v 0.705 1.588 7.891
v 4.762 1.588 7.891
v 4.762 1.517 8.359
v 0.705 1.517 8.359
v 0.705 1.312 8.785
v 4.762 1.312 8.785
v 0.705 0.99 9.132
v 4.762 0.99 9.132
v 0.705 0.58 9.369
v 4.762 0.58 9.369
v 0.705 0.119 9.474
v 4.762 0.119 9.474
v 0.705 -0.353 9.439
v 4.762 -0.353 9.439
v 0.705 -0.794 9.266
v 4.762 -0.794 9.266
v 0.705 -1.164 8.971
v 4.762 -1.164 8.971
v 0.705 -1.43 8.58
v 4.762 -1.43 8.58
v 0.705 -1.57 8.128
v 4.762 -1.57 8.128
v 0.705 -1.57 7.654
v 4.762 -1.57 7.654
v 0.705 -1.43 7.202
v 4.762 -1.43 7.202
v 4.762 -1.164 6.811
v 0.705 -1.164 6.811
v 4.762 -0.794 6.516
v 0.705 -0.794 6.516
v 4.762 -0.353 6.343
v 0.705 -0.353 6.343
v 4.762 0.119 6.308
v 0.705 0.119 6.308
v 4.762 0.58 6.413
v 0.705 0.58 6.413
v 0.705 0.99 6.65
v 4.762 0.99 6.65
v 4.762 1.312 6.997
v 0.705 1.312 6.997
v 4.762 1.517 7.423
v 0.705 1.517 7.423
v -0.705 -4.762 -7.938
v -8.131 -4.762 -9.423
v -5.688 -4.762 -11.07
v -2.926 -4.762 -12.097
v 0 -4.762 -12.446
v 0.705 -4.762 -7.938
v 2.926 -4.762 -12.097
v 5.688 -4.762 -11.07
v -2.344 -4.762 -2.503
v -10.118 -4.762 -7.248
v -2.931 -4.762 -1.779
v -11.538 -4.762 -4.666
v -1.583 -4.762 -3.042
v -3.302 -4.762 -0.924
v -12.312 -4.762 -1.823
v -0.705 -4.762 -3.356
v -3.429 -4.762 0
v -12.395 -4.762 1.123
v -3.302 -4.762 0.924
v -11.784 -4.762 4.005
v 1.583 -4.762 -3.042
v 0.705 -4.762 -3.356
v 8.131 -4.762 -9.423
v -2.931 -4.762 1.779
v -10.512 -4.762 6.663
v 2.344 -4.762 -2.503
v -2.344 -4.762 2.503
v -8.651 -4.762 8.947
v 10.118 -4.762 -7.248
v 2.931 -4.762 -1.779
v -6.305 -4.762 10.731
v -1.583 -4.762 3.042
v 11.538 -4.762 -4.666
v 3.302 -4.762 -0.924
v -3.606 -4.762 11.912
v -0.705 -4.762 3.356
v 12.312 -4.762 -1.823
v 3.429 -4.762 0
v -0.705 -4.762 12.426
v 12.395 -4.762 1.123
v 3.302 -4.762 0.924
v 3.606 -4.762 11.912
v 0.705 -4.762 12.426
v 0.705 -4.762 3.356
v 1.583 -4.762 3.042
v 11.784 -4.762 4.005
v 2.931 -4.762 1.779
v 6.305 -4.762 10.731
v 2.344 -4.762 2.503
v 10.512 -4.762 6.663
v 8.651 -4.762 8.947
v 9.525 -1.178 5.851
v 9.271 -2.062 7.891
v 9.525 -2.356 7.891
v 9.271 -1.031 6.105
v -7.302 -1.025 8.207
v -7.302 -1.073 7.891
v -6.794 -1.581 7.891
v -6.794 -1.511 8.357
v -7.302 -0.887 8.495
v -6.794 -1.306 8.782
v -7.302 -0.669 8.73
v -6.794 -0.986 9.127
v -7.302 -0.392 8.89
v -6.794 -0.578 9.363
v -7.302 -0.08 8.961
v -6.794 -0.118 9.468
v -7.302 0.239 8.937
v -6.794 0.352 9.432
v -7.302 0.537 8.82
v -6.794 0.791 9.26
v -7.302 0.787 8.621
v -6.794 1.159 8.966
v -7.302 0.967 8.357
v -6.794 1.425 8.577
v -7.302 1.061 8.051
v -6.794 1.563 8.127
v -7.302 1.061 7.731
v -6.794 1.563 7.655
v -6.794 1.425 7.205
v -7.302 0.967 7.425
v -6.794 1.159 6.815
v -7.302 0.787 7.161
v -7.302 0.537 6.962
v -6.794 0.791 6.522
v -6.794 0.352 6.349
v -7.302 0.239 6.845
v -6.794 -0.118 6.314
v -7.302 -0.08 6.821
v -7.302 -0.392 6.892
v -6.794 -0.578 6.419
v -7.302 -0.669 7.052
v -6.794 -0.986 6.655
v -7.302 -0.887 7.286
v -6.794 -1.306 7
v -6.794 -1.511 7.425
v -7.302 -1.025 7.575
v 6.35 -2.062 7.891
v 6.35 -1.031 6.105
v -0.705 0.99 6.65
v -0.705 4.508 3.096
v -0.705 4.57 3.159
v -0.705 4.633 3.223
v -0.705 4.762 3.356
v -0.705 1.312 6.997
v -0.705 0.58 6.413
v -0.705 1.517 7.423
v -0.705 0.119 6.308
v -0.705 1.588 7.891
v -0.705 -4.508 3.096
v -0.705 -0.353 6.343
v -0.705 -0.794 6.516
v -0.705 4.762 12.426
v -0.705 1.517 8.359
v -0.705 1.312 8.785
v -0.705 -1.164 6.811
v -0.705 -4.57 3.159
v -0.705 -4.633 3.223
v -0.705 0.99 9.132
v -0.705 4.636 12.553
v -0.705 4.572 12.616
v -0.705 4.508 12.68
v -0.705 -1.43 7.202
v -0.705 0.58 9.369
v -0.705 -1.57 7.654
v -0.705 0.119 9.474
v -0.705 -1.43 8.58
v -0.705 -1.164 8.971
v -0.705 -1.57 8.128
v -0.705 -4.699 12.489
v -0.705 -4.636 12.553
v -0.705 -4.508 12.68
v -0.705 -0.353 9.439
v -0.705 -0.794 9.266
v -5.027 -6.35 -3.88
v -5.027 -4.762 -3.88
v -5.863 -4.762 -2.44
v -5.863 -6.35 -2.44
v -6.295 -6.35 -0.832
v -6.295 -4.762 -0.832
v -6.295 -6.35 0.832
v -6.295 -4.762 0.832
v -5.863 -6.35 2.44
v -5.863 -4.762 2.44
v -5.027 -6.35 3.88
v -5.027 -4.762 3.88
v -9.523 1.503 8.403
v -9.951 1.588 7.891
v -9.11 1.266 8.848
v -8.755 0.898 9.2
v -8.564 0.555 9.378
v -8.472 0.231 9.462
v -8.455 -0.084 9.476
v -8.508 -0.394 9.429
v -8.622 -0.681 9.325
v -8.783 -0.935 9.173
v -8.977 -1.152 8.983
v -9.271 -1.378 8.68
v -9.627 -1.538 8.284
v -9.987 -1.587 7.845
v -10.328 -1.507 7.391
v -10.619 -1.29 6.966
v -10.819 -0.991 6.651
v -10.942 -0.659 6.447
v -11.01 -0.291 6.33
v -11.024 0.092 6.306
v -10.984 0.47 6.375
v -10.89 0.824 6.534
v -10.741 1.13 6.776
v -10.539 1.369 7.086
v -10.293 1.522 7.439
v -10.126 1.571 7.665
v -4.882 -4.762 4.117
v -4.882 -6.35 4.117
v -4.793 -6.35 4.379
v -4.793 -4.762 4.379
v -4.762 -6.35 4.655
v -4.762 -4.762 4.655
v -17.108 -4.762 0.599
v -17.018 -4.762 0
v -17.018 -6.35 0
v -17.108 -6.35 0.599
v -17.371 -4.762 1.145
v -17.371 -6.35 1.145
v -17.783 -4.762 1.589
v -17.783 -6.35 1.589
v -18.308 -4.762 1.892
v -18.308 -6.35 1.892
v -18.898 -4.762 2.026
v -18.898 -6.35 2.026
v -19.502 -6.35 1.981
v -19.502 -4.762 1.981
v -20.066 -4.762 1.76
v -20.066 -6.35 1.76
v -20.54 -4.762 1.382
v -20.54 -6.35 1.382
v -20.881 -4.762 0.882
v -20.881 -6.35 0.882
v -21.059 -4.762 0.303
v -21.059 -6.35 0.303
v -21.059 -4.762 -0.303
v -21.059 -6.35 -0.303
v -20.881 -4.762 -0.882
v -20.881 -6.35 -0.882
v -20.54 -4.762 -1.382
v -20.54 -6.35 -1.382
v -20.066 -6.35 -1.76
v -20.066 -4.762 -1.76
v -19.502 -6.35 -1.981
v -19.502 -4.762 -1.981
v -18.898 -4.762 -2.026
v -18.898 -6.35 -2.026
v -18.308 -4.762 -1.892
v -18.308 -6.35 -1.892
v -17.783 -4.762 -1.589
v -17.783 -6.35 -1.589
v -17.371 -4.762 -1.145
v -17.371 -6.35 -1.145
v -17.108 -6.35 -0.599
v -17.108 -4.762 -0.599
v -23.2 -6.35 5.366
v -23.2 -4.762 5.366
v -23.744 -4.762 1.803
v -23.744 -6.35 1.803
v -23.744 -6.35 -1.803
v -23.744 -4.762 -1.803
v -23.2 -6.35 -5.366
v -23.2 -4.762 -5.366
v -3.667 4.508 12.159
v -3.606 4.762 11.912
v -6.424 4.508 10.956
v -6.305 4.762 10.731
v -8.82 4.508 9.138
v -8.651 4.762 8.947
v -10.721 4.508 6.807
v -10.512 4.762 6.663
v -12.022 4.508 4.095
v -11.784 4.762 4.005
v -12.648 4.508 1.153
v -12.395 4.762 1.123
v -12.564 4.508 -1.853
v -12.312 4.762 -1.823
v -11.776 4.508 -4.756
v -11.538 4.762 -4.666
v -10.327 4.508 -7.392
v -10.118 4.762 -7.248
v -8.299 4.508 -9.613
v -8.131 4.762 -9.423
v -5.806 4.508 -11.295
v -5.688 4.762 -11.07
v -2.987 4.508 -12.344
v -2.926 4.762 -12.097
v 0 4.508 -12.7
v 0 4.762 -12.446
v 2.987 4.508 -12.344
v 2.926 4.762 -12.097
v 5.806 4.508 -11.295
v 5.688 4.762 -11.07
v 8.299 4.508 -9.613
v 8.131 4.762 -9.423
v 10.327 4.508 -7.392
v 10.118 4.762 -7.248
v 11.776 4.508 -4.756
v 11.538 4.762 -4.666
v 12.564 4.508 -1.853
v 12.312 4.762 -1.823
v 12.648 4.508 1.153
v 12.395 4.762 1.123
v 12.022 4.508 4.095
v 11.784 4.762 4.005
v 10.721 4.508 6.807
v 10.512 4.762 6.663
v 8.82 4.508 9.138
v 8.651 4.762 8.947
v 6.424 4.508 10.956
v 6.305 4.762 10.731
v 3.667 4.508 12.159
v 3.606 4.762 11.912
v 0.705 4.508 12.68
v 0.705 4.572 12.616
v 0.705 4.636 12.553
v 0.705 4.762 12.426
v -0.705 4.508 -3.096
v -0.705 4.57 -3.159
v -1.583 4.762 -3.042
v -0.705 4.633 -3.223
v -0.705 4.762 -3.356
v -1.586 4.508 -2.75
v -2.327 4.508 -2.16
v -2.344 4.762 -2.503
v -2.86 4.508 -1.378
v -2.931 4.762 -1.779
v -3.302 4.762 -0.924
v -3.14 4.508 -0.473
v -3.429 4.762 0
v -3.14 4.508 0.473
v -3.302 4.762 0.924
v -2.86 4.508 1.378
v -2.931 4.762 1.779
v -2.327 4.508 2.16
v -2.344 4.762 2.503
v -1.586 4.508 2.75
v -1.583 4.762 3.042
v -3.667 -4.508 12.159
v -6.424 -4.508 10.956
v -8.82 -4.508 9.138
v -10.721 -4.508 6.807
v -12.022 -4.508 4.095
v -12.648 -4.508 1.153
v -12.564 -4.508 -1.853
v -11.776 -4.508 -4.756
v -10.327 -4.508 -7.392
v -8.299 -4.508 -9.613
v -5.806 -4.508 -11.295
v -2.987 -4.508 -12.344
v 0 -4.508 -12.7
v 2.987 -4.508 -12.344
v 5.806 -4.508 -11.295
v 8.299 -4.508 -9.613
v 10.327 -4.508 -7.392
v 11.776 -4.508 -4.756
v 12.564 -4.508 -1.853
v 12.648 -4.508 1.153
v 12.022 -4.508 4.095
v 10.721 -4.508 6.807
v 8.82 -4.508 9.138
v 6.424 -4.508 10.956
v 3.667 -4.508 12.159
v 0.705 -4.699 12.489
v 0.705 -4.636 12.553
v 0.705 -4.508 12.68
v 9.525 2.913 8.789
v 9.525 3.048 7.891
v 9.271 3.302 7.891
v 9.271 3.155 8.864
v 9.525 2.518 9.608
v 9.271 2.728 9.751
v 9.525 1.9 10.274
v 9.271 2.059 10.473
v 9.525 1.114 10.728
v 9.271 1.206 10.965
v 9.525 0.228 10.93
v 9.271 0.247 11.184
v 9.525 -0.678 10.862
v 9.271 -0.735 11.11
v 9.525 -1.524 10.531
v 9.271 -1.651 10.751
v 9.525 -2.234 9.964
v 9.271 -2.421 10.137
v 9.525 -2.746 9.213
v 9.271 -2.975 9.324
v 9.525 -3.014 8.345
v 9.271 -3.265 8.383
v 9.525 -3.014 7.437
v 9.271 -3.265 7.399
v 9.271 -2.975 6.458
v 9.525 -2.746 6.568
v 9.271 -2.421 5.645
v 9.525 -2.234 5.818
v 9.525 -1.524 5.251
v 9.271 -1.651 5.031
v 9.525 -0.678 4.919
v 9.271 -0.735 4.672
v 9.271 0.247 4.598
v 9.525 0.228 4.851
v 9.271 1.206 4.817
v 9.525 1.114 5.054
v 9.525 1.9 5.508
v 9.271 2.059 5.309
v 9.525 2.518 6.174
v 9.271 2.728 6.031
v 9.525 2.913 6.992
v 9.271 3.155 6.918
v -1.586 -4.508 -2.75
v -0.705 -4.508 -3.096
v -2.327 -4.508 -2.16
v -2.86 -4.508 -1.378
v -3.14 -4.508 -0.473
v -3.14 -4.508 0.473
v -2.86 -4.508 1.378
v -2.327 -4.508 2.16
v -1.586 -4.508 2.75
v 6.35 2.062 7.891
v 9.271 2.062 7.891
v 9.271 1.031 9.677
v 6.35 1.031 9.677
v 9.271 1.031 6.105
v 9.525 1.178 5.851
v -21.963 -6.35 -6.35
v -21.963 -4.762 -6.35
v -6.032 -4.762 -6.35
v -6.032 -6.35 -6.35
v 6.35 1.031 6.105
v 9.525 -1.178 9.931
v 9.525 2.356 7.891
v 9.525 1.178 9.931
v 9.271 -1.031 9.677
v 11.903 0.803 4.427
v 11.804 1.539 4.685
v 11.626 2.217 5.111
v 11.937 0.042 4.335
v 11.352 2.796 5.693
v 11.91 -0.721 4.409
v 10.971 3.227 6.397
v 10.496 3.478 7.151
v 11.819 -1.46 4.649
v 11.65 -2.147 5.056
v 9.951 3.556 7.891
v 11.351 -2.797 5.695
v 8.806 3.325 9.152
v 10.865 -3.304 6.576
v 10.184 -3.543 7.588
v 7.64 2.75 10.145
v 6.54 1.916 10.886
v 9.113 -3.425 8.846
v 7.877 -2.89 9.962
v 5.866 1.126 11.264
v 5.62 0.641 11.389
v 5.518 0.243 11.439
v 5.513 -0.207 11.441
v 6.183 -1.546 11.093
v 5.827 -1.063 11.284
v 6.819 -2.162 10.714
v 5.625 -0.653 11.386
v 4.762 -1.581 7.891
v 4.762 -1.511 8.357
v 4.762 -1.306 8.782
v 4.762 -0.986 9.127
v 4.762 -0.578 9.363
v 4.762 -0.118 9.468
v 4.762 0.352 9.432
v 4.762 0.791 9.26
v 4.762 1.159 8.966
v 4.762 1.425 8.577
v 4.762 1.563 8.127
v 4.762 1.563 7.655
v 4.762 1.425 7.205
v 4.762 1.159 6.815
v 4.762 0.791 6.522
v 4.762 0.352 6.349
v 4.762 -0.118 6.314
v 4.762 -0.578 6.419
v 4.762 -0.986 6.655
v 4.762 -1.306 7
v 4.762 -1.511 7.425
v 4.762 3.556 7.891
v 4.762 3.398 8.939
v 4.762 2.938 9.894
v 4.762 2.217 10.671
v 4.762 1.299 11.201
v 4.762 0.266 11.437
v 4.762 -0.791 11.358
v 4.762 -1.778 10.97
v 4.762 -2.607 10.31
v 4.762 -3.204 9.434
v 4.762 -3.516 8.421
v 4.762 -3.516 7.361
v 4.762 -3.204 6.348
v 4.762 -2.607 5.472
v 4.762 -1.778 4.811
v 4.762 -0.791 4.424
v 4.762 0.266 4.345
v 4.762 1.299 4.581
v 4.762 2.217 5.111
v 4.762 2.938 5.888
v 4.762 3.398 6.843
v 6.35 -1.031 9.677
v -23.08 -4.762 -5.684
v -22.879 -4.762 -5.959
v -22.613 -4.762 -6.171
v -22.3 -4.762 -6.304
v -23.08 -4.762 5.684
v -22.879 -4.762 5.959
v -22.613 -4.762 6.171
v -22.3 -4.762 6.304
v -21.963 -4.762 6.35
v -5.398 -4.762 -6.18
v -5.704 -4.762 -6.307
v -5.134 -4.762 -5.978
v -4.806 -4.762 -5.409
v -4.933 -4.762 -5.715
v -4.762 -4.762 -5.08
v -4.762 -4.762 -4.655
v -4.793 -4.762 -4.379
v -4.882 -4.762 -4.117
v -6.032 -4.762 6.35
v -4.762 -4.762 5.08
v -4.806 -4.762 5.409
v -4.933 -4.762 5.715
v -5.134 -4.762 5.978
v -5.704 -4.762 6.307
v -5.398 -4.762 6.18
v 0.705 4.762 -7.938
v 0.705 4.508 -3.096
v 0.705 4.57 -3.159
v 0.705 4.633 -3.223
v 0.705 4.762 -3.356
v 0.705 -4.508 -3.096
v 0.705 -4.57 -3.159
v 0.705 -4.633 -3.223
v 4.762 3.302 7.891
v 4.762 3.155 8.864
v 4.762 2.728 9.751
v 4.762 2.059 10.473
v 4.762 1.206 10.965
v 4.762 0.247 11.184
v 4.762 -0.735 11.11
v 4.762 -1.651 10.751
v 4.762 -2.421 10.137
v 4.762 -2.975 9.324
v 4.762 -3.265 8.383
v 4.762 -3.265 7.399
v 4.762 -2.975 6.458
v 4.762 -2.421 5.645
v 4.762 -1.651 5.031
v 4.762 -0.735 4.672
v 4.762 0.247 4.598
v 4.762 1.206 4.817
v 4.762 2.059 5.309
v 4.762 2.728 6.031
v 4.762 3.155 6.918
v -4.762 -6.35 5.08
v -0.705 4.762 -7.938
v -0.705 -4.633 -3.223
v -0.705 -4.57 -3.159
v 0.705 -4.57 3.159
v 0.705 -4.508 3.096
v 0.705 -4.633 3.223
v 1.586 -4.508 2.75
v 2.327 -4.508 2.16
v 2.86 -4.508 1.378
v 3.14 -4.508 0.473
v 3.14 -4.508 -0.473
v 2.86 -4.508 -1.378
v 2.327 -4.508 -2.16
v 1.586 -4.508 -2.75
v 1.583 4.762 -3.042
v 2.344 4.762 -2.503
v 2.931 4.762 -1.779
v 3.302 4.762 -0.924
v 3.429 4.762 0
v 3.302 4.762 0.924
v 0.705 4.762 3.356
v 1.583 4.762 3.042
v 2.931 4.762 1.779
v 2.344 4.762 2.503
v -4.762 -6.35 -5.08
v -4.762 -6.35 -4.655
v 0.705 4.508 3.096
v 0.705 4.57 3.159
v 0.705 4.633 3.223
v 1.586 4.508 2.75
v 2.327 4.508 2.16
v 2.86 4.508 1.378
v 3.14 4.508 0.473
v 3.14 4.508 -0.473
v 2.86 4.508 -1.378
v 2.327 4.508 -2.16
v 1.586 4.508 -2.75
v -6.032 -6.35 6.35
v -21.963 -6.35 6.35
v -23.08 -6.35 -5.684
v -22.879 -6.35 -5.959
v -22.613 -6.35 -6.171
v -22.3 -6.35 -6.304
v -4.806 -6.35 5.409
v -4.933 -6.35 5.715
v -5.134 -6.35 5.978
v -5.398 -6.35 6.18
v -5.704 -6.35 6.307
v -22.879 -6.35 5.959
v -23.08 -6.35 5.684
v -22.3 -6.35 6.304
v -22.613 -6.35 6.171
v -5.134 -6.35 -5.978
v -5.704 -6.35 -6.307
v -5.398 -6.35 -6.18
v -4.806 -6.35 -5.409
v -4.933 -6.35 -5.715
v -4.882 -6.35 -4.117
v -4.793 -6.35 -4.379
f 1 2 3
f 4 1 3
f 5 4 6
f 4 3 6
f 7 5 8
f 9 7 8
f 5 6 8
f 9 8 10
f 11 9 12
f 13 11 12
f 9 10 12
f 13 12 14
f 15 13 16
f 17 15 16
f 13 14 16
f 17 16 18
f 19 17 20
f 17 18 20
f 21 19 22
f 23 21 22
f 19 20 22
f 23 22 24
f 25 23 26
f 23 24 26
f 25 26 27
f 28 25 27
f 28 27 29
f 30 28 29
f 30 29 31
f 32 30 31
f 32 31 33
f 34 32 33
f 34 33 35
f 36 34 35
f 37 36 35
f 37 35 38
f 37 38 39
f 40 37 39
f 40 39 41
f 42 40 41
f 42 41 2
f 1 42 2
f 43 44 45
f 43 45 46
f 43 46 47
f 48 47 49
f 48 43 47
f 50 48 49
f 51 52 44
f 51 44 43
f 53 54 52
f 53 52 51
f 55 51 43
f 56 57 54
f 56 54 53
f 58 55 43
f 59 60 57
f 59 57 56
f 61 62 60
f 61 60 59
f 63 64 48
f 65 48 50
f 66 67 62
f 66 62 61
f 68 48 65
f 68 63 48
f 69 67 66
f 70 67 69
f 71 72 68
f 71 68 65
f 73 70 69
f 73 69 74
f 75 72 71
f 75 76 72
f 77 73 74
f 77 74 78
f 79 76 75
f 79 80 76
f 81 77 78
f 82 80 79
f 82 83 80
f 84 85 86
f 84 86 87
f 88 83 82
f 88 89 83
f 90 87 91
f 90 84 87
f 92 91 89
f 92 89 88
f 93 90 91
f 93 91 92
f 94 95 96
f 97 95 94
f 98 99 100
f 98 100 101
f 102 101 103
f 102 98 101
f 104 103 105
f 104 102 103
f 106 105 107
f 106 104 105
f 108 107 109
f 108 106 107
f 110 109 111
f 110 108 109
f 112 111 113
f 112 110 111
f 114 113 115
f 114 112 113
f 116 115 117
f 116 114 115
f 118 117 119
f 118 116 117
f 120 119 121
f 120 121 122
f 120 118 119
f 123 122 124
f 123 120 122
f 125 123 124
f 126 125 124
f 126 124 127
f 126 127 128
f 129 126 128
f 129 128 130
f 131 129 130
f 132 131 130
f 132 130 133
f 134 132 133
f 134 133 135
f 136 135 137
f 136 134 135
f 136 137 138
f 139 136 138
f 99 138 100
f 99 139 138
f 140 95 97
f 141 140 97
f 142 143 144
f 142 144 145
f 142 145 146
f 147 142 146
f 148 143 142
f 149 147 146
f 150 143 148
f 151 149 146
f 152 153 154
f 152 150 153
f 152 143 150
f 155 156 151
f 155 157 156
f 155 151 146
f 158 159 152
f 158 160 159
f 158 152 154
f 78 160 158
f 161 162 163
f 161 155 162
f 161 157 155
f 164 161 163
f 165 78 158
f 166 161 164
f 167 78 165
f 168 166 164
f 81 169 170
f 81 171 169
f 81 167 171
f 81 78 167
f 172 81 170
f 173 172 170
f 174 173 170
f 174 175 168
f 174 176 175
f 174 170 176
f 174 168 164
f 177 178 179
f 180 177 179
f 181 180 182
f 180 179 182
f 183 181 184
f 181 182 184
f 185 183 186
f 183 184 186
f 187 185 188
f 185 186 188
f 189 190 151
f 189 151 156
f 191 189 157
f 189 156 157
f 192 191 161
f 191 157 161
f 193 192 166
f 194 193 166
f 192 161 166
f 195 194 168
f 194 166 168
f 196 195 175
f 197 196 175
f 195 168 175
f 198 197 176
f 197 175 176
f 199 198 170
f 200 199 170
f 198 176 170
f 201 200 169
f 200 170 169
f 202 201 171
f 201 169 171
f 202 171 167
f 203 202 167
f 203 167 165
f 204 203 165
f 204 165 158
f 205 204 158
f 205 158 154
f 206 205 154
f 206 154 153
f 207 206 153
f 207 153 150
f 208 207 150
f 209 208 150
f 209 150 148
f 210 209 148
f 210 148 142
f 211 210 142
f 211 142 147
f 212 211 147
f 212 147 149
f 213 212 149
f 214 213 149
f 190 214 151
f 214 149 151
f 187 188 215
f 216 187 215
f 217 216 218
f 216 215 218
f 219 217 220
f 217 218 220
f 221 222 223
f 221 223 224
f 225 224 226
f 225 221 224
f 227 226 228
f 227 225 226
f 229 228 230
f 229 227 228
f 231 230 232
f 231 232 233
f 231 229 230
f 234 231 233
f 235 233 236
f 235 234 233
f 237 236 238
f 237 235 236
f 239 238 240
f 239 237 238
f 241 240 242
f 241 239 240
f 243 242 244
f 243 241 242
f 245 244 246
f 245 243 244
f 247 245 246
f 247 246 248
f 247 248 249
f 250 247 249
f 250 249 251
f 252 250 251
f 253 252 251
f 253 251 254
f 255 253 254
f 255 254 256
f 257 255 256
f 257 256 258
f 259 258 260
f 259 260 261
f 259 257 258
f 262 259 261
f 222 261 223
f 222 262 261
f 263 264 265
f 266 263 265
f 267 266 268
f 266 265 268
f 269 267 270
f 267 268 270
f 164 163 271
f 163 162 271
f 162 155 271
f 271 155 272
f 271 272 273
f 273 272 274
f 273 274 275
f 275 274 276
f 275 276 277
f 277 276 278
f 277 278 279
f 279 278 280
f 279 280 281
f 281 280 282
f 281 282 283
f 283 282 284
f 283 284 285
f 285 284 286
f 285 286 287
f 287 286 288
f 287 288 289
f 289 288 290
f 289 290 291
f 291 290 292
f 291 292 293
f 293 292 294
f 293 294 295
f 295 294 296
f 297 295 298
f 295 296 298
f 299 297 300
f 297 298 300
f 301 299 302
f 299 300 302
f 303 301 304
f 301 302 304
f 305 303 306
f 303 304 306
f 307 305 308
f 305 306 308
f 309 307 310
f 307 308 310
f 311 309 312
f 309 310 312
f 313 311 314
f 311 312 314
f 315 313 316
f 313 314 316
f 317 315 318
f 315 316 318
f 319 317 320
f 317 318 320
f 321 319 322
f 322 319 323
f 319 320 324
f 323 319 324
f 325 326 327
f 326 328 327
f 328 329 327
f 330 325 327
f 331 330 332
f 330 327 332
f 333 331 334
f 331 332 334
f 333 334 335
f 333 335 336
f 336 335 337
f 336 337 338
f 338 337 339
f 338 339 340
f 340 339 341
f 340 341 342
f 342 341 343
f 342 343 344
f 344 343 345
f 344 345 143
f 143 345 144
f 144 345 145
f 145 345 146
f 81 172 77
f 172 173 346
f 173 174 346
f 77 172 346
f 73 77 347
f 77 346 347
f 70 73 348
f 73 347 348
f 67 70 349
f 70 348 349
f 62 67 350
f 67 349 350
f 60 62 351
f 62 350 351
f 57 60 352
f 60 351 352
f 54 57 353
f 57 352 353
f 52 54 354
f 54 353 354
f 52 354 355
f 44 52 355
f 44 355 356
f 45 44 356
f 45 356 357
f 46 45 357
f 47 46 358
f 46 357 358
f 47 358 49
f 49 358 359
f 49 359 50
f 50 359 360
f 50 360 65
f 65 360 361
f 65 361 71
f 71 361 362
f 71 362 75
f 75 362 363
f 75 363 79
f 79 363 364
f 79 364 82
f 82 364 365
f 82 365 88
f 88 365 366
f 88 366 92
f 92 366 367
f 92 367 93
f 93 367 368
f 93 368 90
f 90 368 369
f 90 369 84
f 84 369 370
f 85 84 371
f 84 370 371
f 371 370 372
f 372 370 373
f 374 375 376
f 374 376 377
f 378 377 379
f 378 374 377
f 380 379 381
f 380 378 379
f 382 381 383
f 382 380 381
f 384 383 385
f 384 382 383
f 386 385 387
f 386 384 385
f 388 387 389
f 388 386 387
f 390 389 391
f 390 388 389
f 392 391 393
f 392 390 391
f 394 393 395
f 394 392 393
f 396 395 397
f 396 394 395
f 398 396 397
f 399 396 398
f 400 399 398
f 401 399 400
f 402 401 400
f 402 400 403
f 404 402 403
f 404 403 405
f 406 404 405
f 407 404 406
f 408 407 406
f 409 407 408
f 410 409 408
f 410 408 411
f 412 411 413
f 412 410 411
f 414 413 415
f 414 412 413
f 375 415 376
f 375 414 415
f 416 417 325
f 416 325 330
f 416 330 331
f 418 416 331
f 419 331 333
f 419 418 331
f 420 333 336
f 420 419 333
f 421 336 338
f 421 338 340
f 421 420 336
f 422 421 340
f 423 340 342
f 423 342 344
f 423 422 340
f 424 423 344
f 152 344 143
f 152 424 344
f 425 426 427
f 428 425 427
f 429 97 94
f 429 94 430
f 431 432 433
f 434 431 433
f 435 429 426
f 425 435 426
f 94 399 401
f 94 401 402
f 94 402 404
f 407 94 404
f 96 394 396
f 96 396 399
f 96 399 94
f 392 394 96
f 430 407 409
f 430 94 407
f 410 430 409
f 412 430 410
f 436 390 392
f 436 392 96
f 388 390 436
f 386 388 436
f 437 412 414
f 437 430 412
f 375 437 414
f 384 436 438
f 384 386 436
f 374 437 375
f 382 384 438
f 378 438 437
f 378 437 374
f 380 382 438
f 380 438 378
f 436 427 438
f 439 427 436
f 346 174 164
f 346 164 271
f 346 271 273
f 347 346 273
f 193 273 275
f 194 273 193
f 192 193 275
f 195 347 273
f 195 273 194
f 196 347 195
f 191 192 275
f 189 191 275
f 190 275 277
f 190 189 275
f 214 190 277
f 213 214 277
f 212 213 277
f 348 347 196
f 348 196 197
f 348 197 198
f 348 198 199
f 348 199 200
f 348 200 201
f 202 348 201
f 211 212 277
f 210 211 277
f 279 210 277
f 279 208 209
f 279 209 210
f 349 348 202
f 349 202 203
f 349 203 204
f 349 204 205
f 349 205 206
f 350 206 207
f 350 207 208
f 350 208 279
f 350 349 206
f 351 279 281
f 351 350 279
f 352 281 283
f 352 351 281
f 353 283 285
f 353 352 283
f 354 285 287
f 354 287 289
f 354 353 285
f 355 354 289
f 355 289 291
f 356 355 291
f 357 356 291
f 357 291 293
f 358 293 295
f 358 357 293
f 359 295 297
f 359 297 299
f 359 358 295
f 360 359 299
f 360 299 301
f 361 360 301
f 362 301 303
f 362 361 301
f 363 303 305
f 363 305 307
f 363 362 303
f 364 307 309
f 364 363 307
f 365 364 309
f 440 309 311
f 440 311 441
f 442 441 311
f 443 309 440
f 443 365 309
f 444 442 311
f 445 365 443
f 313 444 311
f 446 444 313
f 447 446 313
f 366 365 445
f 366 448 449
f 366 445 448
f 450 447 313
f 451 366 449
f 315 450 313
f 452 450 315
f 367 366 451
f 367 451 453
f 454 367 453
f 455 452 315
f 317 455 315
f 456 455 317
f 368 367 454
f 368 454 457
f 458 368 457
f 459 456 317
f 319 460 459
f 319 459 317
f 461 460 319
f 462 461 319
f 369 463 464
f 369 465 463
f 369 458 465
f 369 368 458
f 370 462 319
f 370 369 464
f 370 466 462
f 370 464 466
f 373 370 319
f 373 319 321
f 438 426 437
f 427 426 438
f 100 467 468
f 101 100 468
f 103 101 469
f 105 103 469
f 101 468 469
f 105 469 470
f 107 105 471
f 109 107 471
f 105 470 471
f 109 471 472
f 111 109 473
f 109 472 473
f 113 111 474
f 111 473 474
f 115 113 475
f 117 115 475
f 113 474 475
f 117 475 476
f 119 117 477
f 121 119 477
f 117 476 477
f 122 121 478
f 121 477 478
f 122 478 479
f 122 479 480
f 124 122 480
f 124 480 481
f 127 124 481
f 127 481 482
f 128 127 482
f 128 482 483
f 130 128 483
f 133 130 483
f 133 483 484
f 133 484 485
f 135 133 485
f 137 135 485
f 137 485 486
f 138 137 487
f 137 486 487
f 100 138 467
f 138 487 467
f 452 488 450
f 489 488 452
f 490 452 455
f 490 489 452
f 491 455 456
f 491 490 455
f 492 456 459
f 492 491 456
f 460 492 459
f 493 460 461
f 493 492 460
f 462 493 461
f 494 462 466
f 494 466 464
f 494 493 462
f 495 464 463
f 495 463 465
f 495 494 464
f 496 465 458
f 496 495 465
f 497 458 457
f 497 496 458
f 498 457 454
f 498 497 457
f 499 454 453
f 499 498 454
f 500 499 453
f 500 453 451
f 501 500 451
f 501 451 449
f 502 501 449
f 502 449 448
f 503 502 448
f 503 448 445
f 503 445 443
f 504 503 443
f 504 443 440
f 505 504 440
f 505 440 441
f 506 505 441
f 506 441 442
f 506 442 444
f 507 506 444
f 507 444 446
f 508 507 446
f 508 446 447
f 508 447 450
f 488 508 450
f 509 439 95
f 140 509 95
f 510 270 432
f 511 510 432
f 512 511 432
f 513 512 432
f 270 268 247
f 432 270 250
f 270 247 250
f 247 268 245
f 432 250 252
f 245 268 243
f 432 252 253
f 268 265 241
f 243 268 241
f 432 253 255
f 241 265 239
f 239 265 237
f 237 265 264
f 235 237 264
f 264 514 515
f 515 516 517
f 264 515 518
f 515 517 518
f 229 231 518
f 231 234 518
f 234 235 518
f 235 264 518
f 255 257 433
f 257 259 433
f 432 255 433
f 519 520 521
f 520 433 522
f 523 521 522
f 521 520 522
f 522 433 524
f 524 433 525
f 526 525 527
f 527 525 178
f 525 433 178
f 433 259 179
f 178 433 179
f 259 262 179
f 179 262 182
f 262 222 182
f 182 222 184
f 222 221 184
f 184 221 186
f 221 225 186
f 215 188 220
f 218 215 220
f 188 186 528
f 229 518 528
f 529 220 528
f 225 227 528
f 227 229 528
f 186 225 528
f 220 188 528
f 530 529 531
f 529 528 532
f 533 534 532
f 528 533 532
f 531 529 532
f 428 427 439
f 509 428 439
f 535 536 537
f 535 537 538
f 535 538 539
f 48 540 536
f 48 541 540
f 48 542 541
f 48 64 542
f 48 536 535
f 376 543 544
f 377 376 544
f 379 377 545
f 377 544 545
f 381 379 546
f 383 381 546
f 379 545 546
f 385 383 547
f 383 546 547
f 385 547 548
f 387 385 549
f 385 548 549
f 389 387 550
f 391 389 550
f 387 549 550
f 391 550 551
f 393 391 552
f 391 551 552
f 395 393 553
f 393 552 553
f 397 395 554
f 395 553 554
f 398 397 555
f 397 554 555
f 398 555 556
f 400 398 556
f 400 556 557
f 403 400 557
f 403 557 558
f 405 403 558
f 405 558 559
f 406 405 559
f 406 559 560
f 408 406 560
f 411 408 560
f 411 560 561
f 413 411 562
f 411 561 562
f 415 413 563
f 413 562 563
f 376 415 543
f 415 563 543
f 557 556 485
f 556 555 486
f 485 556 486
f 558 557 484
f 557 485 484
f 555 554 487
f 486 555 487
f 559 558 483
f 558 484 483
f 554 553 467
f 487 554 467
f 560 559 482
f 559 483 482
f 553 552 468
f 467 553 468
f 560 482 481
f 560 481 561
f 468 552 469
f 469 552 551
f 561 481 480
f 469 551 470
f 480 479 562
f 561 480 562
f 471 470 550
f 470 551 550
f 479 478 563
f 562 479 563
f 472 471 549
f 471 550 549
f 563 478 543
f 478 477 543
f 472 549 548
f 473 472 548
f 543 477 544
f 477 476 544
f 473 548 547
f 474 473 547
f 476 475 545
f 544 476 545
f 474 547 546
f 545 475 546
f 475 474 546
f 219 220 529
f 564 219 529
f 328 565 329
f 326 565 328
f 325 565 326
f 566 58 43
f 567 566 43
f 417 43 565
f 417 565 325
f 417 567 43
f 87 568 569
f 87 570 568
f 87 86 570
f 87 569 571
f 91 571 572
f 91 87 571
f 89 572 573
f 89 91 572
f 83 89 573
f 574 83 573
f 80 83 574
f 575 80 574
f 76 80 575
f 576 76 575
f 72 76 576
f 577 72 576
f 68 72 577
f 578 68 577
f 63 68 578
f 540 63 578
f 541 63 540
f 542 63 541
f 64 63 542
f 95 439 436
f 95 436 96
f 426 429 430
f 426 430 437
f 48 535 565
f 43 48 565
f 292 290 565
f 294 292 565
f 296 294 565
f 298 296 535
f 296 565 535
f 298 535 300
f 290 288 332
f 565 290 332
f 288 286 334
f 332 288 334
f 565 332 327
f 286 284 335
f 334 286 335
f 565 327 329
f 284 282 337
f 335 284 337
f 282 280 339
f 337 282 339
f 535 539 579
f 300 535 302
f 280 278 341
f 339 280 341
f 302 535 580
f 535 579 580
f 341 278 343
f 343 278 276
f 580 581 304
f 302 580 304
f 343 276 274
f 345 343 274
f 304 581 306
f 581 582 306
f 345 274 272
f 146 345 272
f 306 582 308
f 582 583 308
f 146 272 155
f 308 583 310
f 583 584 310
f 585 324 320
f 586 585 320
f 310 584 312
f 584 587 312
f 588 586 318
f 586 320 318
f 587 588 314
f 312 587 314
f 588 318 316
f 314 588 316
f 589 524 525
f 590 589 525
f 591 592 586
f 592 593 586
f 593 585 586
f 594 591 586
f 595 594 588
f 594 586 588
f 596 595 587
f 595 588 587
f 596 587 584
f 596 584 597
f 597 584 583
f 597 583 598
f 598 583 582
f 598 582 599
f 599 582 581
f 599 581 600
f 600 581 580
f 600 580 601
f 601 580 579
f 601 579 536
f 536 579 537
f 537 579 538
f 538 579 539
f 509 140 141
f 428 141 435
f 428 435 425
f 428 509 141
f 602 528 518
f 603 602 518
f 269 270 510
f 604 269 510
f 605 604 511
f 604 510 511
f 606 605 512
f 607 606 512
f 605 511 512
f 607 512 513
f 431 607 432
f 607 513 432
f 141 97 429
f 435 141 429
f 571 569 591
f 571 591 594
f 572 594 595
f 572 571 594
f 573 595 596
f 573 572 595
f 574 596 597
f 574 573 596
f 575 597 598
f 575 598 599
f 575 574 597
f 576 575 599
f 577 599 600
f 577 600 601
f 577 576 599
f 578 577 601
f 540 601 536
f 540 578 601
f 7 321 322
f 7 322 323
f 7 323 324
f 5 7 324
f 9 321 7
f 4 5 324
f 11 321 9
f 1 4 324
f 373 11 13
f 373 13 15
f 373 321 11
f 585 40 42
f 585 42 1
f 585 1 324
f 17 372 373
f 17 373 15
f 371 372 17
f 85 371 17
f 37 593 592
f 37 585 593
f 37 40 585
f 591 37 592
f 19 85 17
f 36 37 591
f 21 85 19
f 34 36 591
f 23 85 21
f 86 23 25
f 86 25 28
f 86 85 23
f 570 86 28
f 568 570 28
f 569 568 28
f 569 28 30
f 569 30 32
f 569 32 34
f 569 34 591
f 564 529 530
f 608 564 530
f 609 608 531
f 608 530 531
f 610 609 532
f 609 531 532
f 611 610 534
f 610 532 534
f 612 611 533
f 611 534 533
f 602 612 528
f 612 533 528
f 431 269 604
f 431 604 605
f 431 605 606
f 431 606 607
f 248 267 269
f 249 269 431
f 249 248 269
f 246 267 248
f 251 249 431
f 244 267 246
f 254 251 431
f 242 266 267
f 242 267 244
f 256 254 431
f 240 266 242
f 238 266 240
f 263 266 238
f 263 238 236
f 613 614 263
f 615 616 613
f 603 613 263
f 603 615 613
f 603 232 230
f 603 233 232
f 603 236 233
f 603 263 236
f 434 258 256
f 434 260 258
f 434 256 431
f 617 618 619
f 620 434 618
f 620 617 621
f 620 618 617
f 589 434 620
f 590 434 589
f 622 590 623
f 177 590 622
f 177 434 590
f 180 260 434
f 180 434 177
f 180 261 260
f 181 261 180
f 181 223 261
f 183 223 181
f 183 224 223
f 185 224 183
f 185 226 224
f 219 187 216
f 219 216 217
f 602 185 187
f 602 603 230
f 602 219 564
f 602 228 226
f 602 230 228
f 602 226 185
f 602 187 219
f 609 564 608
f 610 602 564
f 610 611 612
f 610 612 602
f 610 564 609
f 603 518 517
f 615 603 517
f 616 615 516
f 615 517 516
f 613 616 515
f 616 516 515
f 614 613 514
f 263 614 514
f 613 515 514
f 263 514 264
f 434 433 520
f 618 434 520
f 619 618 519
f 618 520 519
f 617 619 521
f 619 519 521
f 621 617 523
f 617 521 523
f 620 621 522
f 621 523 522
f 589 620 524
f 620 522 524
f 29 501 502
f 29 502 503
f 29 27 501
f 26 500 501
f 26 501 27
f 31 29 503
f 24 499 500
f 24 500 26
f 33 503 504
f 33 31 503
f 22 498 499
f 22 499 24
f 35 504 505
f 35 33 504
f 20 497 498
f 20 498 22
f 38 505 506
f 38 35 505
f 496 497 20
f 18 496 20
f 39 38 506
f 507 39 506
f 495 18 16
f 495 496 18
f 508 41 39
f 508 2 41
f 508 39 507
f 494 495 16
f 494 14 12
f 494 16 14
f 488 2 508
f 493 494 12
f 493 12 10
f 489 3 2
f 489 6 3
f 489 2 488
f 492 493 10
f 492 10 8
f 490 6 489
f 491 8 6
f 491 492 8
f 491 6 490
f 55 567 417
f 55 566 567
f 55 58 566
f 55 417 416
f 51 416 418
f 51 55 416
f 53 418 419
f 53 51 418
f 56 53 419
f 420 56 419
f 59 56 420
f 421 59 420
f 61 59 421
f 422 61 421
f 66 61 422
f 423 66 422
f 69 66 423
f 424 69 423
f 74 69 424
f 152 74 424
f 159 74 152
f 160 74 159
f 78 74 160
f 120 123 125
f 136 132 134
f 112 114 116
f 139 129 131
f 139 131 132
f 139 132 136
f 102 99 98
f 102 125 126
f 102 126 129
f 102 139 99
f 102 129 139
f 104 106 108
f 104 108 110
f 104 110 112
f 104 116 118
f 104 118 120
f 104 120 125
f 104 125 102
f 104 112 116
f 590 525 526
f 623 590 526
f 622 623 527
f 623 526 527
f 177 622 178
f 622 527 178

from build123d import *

# Parameters (mm, degrees)
F1_DEPTH  = 4.7625
F2_SIZE   = 0.254
F3_R      = 2.032
F4_DEPTH  = 1.5875
F6_R      = 3.556
F7_DEPTH  = 25.4
F8_R      = 1.5875
F9_DEPTH  = 25.4
F10_R     = 3.302
F11_DEPTH = 4.7625
F12_R     = 1.58115
F13_DEPTH = 12.065
F14_SIZE  = 0.508
F16_DEPTH = 3.175
F17_SIZE  = 0.254


with BuildPart() as f1:
    # F0 (on Front) → F1 (new body, symmetric)
    with BuildSketch(Plane.XZ):
        with BuildLine():
            Line((-0.70485, 3.0957731631), (-0.70485, 12.6804253272))
            ThreePointArc((-0.70485, 12.6804253272), (0, -12.7), (0.70485, 12.6804253272))
            Line((0.70485, 12.6804253272), (0.70485, 3.0957731631))
            ThreePointArc((0.70485, 3.0957731631), (3.175, 0), (0.70485, -3.0957731631))
            Line((0.70485, -3.0957731631), (0.70485, -7.9375))
            Line((0.70485, -7.9375), (-0.70485, -7.9375))
            Line((-0.70485, -7.9375), (-0.70485, -3.0957731631))
            ThreePointArc((-0.70485, -3.0957731631), (-3.175, 0), (-0.70485, 3.0957731631))
        make_face()
    extrude(amount=F1_DEPTH, both=True)

    # F2
    f2_edges = [f1.edges().sort_by_distance(p)[0] for p in [
        (0, -4.7625, -12.7),
        (-3.175, -4.7625, 0),
        (0, 4.7625, -12.7),
        (-3.175, 4.7625, 0),
        (3.175, 4.7625, 0),
        (3.175, -4.7625, 0),
    ]]
    chamfer(f2_edges, length=F2_SIZE)

    # F6 (on offset) → F7 (cut)
    with BuildSketch(Plane.YZ.offset(4.7625)):
        with Locations((0, 7.8909002254)):
            Circle(F6_R)
    extrude(amount=F7_DEPTH, mode=Mode.SUBTRACT)

    # F8 (on face) → F9 (cut)
    with BuildSketch(Plane.YZ.offset(4.7625)):
        with Locations((0, 7.8909002254)):
            Circle(F8_R)
    extrude(amount=-F9_DEPTH, mode=Mode.SUBTRACT)


with BuildPart() as f4:
    # F3 (on face) → F4 (new body)
    with BuildSketch(Plane.XZ.offset(4.7625)):
        with BuildLine():
            Line((-10.7042242129, 6.35), (-21.962647979, 6.35))
            ThreePointArc((-21.962647979, 6.35), (-22.75303699, 6.0740750531), (-23.1999802595, 5.3661971831))
            ThreePointArc((-23.1999802595, 5.3661971831), (-23.8125, 0), (-23.1999802595, -5.3661971831))
            ThreePointArc((-23.1999802595, -5.3661971831), (-22.75303699, -6.0740750531), (-21.962647979, -6.35))
            Line((-21.962647979, -6.35), (-10.7042242129, -6.35))
            ThreePointArc((-10.7042242129, -6.35), (-12.446, 0), (-10.7042242129, 6.35))
        make_face()
        with Locations((-19.05, 0)):
            Circle(F3_R, mode=Mode.SUBTRACT)
        with BuildLine():
            Line((-6.0325, 6.35), (-10.7042242129, 6.35))
            ThreePointArc((-10.7042242129, 6.35), (-12.446, 0), (-10.7042242129, -6.35))
            Line((-10.7042242129, -6.35), (-6.0325, -6.35))
            ThreePointArc((-6.0325, -6.35), (-5.1344743879, -5.9780256121), (-4.7625, -5.08))
            Line((-4.7625, -5.08), (-4.7625, -4.6554638598))
            ThreePointArc((-4.7625, -4.6554638598), (-4.8304644001, -4.2455731223), (-5.0270833333, -3.8795532165))
            ThreePointArc((-5.0270833333, -3.8795532165), (-6.35, 0), (-5.0270833333, 3.8795532165))
            ThreePointArc((-5.0270833333, 3.8795532165), (-4.8304644001, 4.2455731223), (-4.7625, 4.6554638598))
            Line((-4.7625, 4.6554638598), (-4.7625, 5.08))
            ThreePointArc((-4.7625, 5.08), (-5.1344743879, 5.9780256121), (-6.0325, 6.35))
        make_face()
    extrude(amount=F4_DEPTH)


with BuildPart() as f11:
    # F10 (on face) → F11 (new body)
    with BuildSketch(Plane.YZ.offset(4.7625)):
        with Locations((0, 7.8909002254)):
            Circle(F10_R)
    extrude(amount=F11_DEPTH)

    # F12 (on face) → F13 (join)
    with BuildSketch(Plane(origin=(4.7625, 0, 0), x_dir=(0, -1, 0), z_dir=(-1, 0, 0))):
        with Locations((0, 7.8909002254)):
            Circle(F12_R)
    extrude(amount=F13_DEPTH)

    # F14
    f14_edges = [f11.edges().sort_by_distance(p)[0] for p in [
        (-7.3025, 1.58115, 7.8909),
    ]]
    chamfer(f14_edges, length=F14_SIZE)

    # F15 (on face) → F16 (cut)
    with BuildSketch(Plane.YZ.offset(9.525)):
        Polygon((1.0311114964, 9.6768377254), (-1.0311114964, 9.6768377254), (-2.0622229928, 7.8909002254), (-1.0311114964, 6.1049627254), (1.0311114964, 6.1049627254), (2.0622229928, 7.8909002254), align=None)
    extrude(amount=-F16_DEPTH, mode=Mode.SUBTRACT)

    # F17
    f17_edges = [f11.edges().sort_by_distance(p)[0] for p in [
        (9.525, -3.302, 7.8909),
        (9.525, 0, 9.676838),
        (9.525, -1.546667, 8.783869),
        (9.525, -1.546667, 6.997931),
        (9.525, 0, 6.104963),
        (9.525, 1.546667, 6.997931),
        (9.525, 1.546667, 8.783869),
    ]]
    chamfer(f17_edges, length=F17_SIZE)


solid = Compound([f1.part, f4.part, f11.part])
